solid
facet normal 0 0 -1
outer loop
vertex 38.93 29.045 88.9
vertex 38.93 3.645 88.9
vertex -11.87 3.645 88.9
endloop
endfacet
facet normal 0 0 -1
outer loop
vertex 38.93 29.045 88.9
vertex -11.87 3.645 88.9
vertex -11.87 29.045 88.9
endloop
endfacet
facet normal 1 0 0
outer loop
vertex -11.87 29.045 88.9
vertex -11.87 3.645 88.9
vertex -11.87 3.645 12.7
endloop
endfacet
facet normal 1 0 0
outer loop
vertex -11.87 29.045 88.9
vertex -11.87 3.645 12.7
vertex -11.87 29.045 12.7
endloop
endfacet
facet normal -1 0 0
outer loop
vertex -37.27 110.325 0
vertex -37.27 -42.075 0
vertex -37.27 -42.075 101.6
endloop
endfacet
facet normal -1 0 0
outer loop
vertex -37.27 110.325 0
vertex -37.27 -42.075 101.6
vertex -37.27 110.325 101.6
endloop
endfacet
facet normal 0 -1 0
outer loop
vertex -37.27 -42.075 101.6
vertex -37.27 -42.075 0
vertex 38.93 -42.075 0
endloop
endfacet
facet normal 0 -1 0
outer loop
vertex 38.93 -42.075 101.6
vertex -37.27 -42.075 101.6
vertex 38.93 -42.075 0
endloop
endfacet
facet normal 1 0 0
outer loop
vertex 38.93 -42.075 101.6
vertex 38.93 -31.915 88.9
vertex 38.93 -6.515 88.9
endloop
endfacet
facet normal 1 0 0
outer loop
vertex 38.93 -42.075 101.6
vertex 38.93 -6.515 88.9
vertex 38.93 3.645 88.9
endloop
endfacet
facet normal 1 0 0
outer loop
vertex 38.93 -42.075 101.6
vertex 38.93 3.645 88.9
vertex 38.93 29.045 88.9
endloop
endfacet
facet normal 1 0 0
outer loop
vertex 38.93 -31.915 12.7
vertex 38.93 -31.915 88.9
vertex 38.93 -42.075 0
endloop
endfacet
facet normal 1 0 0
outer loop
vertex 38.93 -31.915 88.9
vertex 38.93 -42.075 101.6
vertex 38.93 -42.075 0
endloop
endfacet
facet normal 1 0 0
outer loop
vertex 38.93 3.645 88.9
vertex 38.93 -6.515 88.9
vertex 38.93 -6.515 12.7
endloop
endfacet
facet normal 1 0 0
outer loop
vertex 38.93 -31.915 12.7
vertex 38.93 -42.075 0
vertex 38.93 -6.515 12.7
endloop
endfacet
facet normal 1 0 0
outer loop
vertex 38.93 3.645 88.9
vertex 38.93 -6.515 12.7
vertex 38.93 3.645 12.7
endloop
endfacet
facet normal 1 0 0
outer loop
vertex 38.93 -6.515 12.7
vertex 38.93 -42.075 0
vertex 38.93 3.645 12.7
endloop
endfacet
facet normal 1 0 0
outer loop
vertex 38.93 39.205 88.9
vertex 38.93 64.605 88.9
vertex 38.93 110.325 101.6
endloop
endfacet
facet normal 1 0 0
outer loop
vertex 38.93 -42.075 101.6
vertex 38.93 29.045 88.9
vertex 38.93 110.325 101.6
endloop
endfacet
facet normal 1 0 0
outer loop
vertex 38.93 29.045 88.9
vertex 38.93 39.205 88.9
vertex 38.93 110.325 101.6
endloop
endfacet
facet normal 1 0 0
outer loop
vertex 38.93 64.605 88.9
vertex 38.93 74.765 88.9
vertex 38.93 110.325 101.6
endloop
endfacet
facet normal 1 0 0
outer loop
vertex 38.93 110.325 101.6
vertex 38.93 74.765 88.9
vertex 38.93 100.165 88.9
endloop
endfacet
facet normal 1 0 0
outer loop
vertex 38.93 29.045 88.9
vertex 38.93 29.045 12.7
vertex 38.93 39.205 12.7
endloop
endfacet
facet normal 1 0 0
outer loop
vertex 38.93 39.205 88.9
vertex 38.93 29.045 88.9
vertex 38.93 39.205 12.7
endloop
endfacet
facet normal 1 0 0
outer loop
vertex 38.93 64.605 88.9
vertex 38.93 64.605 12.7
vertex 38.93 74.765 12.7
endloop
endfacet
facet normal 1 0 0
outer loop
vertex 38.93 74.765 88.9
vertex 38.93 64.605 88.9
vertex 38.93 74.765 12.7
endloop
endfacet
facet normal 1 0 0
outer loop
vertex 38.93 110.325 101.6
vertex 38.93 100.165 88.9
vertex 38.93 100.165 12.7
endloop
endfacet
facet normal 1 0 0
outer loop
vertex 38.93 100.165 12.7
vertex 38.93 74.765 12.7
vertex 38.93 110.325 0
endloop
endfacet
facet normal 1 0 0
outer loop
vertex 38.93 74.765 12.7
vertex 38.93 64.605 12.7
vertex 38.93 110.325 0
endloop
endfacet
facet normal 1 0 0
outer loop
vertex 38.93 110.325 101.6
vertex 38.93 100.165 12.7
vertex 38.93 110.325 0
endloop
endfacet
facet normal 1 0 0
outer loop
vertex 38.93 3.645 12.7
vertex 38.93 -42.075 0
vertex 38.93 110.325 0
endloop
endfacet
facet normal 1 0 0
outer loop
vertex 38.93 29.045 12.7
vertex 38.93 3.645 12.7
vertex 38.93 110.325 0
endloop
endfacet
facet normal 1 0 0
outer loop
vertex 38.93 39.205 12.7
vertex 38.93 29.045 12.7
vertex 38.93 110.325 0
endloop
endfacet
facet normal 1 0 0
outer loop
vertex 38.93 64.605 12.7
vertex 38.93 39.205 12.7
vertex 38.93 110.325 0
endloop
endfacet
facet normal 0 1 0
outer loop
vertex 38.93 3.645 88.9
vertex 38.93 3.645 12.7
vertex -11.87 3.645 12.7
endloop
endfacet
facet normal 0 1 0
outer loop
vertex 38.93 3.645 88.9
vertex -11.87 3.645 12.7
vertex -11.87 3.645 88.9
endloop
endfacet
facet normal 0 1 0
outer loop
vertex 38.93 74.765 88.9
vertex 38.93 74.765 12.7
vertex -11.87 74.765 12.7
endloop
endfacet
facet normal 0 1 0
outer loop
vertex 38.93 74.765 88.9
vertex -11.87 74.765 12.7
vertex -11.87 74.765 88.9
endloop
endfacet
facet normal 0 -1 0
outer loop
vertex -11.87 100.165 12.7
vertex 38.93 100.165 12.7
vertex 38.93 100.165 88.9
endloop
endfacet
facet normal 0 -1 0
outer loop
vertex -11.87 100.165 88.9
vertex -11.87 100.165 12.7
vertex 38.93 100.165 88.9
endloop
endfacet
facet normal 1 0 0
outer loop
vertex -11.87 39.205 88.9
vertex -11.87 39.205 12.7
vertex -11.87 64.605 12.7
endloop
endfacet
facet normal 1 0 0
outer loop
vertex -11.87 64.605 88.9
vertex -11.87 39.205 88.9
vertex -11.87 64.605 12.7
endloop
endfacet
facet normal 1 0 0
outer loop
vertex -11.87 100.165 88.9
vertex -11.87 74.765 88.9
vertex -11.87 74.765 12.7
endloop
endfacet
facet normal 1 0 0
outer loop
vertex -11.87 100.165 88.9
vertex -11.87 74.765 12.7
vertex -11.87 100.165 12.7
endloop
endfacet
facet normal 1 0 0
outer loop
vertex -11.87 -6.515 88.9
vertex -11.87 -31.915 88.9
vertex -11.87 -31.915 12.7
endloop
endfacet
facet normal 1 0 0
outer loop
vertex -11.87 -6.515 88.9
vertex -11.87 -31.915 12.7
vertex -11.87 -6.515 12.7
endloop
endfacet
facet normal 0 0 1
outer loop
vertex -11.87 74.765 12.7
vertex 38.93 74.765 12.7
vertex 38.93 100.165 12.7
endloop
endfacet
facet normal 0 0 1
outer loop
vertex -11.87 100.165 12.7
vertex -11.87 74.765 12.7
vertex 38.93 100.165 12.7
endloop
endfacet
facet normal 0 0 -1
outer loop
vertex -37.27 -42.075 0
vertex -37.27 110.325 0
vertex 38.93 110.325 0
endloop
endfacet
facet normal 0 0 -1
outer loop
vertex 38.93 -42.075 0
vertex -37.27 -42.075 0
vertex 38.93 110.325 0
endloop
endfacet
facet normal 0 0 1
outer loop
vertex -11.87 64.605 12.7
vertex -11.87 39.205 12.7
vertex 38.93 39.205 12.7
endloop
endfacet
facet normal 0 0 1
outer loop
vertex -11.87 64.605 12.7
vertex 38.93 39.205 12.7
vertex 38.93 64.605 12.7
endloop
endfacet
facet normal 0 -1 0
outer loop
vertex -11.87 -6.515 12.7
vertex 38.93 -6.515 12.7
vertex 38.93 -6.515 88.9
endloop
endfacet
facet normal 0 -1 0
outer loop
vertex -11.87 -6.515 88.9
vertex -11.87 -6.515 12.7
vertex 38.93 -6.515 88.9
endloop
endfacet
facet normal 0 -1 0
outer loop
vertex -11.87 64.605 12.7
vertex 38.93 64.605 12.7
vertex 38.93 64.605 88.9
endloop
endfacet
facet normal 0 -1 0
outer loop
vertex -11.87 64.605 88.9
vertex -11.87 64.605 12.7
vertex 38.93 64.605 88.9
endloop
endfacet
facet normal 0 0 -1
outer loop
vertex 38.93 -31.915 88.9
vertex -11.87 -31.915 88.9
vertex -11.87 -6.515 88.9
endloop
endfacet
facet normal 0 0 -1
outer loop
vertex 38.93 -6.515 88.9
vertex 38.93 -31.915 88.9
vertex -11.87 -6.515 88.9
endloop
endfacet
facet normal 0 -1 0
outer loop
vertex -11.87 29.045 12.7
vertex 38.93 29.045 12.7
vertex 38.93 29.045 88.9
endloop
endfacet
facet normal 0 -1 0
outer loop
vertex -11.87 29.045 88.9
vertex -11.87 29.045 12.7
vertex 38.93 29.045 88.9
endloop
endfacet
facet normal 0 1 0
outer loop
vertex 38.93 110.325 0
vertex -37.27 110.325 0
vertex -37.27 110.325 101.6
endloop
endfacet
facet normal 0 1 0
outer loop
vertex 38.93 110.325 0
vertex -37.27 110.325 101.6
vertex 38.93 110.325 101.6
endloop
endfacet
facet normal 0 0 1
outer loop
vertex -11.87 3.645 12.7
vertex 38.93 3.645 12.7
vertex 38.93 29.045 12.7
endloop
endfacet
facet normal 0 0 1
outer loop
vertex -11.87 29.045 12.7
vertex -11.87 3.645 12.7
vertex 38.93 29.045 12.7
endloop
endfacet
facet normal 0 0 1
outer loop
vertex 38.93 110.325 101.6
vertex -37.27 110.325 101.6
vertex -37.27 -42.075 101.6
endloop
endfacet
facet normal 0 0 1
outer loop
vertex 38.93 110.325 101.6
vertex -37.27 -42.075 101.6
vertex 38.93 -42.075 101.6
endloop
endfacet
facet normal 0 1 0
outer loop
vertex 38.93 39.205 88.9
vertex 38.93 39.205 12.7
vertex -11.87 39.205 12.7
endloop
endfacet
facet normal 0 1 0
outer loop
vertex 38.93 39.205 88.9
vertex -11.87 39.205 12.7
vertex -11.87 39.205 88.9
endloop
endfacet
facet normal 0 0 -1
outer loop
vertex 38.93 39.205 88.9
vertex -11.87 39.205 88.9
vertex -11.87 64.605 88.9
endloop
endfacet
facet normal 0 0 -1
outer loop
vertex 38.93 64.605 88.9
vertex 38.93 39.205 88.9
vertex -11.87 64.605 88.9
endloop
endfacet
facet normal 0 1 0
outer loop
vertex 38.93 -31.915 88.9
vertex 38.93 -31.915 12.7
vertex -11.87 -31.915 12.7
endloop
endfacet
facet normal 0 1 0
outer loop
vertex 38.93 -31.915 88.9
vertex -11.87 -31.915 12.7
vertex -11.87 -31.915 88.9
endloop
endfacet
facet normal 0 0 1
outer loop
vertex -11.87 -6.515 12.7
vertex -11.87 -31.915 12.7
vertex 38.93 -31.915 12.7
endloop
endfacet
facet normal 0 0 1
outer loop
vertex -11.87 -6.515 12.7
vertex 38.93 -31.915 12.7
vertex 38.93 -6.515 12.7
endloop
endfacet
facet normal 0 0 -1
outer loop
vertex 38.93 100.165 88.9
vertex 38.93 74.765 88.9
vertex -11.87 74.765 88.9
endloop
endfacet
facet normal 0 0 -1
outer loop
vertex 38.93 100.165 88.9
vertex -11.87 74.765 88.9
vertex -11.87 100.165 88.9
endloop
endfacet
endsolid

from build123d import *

# Parameters (mm, degrees)
F0_W     = 76.2
F0_H     = 152.4
F1_DEPTH = 101.6
F2_W     = 25.4
F2_H     = 76.2
F3_DEPTH = 50.8


with BuildPart() as f1:
    # F0 (on Top) → F1 (new body)
    with BuildSketch(Plane.XY):
        with Locations((0.829596, 34.125201)):
            Rectangle(F0_W, F0_H)
    extrude(amount=F1_DEPTH)

    # F2 (on face) → F3 (cut)
    with BuildSketch(Plane.YZ.offset(38.929596)):
        with Locations((87.465201, 50.8)):
            Rectangle(F2_W, F2_H)
        with Locations((51.905201, 50.8)):
            Rectangle(F2_W, F2_H)
        with Locations((16.345201, 50.8)):
            Rectangle(F2_W, F2_H)
        with Locations((-19.214799, 50.8)):
            Rectangle(F2_W, F2_H)
    extrude(amount=-F3_DEPTH, mode=Mode.SUBTRACT)


solid = f1.part
